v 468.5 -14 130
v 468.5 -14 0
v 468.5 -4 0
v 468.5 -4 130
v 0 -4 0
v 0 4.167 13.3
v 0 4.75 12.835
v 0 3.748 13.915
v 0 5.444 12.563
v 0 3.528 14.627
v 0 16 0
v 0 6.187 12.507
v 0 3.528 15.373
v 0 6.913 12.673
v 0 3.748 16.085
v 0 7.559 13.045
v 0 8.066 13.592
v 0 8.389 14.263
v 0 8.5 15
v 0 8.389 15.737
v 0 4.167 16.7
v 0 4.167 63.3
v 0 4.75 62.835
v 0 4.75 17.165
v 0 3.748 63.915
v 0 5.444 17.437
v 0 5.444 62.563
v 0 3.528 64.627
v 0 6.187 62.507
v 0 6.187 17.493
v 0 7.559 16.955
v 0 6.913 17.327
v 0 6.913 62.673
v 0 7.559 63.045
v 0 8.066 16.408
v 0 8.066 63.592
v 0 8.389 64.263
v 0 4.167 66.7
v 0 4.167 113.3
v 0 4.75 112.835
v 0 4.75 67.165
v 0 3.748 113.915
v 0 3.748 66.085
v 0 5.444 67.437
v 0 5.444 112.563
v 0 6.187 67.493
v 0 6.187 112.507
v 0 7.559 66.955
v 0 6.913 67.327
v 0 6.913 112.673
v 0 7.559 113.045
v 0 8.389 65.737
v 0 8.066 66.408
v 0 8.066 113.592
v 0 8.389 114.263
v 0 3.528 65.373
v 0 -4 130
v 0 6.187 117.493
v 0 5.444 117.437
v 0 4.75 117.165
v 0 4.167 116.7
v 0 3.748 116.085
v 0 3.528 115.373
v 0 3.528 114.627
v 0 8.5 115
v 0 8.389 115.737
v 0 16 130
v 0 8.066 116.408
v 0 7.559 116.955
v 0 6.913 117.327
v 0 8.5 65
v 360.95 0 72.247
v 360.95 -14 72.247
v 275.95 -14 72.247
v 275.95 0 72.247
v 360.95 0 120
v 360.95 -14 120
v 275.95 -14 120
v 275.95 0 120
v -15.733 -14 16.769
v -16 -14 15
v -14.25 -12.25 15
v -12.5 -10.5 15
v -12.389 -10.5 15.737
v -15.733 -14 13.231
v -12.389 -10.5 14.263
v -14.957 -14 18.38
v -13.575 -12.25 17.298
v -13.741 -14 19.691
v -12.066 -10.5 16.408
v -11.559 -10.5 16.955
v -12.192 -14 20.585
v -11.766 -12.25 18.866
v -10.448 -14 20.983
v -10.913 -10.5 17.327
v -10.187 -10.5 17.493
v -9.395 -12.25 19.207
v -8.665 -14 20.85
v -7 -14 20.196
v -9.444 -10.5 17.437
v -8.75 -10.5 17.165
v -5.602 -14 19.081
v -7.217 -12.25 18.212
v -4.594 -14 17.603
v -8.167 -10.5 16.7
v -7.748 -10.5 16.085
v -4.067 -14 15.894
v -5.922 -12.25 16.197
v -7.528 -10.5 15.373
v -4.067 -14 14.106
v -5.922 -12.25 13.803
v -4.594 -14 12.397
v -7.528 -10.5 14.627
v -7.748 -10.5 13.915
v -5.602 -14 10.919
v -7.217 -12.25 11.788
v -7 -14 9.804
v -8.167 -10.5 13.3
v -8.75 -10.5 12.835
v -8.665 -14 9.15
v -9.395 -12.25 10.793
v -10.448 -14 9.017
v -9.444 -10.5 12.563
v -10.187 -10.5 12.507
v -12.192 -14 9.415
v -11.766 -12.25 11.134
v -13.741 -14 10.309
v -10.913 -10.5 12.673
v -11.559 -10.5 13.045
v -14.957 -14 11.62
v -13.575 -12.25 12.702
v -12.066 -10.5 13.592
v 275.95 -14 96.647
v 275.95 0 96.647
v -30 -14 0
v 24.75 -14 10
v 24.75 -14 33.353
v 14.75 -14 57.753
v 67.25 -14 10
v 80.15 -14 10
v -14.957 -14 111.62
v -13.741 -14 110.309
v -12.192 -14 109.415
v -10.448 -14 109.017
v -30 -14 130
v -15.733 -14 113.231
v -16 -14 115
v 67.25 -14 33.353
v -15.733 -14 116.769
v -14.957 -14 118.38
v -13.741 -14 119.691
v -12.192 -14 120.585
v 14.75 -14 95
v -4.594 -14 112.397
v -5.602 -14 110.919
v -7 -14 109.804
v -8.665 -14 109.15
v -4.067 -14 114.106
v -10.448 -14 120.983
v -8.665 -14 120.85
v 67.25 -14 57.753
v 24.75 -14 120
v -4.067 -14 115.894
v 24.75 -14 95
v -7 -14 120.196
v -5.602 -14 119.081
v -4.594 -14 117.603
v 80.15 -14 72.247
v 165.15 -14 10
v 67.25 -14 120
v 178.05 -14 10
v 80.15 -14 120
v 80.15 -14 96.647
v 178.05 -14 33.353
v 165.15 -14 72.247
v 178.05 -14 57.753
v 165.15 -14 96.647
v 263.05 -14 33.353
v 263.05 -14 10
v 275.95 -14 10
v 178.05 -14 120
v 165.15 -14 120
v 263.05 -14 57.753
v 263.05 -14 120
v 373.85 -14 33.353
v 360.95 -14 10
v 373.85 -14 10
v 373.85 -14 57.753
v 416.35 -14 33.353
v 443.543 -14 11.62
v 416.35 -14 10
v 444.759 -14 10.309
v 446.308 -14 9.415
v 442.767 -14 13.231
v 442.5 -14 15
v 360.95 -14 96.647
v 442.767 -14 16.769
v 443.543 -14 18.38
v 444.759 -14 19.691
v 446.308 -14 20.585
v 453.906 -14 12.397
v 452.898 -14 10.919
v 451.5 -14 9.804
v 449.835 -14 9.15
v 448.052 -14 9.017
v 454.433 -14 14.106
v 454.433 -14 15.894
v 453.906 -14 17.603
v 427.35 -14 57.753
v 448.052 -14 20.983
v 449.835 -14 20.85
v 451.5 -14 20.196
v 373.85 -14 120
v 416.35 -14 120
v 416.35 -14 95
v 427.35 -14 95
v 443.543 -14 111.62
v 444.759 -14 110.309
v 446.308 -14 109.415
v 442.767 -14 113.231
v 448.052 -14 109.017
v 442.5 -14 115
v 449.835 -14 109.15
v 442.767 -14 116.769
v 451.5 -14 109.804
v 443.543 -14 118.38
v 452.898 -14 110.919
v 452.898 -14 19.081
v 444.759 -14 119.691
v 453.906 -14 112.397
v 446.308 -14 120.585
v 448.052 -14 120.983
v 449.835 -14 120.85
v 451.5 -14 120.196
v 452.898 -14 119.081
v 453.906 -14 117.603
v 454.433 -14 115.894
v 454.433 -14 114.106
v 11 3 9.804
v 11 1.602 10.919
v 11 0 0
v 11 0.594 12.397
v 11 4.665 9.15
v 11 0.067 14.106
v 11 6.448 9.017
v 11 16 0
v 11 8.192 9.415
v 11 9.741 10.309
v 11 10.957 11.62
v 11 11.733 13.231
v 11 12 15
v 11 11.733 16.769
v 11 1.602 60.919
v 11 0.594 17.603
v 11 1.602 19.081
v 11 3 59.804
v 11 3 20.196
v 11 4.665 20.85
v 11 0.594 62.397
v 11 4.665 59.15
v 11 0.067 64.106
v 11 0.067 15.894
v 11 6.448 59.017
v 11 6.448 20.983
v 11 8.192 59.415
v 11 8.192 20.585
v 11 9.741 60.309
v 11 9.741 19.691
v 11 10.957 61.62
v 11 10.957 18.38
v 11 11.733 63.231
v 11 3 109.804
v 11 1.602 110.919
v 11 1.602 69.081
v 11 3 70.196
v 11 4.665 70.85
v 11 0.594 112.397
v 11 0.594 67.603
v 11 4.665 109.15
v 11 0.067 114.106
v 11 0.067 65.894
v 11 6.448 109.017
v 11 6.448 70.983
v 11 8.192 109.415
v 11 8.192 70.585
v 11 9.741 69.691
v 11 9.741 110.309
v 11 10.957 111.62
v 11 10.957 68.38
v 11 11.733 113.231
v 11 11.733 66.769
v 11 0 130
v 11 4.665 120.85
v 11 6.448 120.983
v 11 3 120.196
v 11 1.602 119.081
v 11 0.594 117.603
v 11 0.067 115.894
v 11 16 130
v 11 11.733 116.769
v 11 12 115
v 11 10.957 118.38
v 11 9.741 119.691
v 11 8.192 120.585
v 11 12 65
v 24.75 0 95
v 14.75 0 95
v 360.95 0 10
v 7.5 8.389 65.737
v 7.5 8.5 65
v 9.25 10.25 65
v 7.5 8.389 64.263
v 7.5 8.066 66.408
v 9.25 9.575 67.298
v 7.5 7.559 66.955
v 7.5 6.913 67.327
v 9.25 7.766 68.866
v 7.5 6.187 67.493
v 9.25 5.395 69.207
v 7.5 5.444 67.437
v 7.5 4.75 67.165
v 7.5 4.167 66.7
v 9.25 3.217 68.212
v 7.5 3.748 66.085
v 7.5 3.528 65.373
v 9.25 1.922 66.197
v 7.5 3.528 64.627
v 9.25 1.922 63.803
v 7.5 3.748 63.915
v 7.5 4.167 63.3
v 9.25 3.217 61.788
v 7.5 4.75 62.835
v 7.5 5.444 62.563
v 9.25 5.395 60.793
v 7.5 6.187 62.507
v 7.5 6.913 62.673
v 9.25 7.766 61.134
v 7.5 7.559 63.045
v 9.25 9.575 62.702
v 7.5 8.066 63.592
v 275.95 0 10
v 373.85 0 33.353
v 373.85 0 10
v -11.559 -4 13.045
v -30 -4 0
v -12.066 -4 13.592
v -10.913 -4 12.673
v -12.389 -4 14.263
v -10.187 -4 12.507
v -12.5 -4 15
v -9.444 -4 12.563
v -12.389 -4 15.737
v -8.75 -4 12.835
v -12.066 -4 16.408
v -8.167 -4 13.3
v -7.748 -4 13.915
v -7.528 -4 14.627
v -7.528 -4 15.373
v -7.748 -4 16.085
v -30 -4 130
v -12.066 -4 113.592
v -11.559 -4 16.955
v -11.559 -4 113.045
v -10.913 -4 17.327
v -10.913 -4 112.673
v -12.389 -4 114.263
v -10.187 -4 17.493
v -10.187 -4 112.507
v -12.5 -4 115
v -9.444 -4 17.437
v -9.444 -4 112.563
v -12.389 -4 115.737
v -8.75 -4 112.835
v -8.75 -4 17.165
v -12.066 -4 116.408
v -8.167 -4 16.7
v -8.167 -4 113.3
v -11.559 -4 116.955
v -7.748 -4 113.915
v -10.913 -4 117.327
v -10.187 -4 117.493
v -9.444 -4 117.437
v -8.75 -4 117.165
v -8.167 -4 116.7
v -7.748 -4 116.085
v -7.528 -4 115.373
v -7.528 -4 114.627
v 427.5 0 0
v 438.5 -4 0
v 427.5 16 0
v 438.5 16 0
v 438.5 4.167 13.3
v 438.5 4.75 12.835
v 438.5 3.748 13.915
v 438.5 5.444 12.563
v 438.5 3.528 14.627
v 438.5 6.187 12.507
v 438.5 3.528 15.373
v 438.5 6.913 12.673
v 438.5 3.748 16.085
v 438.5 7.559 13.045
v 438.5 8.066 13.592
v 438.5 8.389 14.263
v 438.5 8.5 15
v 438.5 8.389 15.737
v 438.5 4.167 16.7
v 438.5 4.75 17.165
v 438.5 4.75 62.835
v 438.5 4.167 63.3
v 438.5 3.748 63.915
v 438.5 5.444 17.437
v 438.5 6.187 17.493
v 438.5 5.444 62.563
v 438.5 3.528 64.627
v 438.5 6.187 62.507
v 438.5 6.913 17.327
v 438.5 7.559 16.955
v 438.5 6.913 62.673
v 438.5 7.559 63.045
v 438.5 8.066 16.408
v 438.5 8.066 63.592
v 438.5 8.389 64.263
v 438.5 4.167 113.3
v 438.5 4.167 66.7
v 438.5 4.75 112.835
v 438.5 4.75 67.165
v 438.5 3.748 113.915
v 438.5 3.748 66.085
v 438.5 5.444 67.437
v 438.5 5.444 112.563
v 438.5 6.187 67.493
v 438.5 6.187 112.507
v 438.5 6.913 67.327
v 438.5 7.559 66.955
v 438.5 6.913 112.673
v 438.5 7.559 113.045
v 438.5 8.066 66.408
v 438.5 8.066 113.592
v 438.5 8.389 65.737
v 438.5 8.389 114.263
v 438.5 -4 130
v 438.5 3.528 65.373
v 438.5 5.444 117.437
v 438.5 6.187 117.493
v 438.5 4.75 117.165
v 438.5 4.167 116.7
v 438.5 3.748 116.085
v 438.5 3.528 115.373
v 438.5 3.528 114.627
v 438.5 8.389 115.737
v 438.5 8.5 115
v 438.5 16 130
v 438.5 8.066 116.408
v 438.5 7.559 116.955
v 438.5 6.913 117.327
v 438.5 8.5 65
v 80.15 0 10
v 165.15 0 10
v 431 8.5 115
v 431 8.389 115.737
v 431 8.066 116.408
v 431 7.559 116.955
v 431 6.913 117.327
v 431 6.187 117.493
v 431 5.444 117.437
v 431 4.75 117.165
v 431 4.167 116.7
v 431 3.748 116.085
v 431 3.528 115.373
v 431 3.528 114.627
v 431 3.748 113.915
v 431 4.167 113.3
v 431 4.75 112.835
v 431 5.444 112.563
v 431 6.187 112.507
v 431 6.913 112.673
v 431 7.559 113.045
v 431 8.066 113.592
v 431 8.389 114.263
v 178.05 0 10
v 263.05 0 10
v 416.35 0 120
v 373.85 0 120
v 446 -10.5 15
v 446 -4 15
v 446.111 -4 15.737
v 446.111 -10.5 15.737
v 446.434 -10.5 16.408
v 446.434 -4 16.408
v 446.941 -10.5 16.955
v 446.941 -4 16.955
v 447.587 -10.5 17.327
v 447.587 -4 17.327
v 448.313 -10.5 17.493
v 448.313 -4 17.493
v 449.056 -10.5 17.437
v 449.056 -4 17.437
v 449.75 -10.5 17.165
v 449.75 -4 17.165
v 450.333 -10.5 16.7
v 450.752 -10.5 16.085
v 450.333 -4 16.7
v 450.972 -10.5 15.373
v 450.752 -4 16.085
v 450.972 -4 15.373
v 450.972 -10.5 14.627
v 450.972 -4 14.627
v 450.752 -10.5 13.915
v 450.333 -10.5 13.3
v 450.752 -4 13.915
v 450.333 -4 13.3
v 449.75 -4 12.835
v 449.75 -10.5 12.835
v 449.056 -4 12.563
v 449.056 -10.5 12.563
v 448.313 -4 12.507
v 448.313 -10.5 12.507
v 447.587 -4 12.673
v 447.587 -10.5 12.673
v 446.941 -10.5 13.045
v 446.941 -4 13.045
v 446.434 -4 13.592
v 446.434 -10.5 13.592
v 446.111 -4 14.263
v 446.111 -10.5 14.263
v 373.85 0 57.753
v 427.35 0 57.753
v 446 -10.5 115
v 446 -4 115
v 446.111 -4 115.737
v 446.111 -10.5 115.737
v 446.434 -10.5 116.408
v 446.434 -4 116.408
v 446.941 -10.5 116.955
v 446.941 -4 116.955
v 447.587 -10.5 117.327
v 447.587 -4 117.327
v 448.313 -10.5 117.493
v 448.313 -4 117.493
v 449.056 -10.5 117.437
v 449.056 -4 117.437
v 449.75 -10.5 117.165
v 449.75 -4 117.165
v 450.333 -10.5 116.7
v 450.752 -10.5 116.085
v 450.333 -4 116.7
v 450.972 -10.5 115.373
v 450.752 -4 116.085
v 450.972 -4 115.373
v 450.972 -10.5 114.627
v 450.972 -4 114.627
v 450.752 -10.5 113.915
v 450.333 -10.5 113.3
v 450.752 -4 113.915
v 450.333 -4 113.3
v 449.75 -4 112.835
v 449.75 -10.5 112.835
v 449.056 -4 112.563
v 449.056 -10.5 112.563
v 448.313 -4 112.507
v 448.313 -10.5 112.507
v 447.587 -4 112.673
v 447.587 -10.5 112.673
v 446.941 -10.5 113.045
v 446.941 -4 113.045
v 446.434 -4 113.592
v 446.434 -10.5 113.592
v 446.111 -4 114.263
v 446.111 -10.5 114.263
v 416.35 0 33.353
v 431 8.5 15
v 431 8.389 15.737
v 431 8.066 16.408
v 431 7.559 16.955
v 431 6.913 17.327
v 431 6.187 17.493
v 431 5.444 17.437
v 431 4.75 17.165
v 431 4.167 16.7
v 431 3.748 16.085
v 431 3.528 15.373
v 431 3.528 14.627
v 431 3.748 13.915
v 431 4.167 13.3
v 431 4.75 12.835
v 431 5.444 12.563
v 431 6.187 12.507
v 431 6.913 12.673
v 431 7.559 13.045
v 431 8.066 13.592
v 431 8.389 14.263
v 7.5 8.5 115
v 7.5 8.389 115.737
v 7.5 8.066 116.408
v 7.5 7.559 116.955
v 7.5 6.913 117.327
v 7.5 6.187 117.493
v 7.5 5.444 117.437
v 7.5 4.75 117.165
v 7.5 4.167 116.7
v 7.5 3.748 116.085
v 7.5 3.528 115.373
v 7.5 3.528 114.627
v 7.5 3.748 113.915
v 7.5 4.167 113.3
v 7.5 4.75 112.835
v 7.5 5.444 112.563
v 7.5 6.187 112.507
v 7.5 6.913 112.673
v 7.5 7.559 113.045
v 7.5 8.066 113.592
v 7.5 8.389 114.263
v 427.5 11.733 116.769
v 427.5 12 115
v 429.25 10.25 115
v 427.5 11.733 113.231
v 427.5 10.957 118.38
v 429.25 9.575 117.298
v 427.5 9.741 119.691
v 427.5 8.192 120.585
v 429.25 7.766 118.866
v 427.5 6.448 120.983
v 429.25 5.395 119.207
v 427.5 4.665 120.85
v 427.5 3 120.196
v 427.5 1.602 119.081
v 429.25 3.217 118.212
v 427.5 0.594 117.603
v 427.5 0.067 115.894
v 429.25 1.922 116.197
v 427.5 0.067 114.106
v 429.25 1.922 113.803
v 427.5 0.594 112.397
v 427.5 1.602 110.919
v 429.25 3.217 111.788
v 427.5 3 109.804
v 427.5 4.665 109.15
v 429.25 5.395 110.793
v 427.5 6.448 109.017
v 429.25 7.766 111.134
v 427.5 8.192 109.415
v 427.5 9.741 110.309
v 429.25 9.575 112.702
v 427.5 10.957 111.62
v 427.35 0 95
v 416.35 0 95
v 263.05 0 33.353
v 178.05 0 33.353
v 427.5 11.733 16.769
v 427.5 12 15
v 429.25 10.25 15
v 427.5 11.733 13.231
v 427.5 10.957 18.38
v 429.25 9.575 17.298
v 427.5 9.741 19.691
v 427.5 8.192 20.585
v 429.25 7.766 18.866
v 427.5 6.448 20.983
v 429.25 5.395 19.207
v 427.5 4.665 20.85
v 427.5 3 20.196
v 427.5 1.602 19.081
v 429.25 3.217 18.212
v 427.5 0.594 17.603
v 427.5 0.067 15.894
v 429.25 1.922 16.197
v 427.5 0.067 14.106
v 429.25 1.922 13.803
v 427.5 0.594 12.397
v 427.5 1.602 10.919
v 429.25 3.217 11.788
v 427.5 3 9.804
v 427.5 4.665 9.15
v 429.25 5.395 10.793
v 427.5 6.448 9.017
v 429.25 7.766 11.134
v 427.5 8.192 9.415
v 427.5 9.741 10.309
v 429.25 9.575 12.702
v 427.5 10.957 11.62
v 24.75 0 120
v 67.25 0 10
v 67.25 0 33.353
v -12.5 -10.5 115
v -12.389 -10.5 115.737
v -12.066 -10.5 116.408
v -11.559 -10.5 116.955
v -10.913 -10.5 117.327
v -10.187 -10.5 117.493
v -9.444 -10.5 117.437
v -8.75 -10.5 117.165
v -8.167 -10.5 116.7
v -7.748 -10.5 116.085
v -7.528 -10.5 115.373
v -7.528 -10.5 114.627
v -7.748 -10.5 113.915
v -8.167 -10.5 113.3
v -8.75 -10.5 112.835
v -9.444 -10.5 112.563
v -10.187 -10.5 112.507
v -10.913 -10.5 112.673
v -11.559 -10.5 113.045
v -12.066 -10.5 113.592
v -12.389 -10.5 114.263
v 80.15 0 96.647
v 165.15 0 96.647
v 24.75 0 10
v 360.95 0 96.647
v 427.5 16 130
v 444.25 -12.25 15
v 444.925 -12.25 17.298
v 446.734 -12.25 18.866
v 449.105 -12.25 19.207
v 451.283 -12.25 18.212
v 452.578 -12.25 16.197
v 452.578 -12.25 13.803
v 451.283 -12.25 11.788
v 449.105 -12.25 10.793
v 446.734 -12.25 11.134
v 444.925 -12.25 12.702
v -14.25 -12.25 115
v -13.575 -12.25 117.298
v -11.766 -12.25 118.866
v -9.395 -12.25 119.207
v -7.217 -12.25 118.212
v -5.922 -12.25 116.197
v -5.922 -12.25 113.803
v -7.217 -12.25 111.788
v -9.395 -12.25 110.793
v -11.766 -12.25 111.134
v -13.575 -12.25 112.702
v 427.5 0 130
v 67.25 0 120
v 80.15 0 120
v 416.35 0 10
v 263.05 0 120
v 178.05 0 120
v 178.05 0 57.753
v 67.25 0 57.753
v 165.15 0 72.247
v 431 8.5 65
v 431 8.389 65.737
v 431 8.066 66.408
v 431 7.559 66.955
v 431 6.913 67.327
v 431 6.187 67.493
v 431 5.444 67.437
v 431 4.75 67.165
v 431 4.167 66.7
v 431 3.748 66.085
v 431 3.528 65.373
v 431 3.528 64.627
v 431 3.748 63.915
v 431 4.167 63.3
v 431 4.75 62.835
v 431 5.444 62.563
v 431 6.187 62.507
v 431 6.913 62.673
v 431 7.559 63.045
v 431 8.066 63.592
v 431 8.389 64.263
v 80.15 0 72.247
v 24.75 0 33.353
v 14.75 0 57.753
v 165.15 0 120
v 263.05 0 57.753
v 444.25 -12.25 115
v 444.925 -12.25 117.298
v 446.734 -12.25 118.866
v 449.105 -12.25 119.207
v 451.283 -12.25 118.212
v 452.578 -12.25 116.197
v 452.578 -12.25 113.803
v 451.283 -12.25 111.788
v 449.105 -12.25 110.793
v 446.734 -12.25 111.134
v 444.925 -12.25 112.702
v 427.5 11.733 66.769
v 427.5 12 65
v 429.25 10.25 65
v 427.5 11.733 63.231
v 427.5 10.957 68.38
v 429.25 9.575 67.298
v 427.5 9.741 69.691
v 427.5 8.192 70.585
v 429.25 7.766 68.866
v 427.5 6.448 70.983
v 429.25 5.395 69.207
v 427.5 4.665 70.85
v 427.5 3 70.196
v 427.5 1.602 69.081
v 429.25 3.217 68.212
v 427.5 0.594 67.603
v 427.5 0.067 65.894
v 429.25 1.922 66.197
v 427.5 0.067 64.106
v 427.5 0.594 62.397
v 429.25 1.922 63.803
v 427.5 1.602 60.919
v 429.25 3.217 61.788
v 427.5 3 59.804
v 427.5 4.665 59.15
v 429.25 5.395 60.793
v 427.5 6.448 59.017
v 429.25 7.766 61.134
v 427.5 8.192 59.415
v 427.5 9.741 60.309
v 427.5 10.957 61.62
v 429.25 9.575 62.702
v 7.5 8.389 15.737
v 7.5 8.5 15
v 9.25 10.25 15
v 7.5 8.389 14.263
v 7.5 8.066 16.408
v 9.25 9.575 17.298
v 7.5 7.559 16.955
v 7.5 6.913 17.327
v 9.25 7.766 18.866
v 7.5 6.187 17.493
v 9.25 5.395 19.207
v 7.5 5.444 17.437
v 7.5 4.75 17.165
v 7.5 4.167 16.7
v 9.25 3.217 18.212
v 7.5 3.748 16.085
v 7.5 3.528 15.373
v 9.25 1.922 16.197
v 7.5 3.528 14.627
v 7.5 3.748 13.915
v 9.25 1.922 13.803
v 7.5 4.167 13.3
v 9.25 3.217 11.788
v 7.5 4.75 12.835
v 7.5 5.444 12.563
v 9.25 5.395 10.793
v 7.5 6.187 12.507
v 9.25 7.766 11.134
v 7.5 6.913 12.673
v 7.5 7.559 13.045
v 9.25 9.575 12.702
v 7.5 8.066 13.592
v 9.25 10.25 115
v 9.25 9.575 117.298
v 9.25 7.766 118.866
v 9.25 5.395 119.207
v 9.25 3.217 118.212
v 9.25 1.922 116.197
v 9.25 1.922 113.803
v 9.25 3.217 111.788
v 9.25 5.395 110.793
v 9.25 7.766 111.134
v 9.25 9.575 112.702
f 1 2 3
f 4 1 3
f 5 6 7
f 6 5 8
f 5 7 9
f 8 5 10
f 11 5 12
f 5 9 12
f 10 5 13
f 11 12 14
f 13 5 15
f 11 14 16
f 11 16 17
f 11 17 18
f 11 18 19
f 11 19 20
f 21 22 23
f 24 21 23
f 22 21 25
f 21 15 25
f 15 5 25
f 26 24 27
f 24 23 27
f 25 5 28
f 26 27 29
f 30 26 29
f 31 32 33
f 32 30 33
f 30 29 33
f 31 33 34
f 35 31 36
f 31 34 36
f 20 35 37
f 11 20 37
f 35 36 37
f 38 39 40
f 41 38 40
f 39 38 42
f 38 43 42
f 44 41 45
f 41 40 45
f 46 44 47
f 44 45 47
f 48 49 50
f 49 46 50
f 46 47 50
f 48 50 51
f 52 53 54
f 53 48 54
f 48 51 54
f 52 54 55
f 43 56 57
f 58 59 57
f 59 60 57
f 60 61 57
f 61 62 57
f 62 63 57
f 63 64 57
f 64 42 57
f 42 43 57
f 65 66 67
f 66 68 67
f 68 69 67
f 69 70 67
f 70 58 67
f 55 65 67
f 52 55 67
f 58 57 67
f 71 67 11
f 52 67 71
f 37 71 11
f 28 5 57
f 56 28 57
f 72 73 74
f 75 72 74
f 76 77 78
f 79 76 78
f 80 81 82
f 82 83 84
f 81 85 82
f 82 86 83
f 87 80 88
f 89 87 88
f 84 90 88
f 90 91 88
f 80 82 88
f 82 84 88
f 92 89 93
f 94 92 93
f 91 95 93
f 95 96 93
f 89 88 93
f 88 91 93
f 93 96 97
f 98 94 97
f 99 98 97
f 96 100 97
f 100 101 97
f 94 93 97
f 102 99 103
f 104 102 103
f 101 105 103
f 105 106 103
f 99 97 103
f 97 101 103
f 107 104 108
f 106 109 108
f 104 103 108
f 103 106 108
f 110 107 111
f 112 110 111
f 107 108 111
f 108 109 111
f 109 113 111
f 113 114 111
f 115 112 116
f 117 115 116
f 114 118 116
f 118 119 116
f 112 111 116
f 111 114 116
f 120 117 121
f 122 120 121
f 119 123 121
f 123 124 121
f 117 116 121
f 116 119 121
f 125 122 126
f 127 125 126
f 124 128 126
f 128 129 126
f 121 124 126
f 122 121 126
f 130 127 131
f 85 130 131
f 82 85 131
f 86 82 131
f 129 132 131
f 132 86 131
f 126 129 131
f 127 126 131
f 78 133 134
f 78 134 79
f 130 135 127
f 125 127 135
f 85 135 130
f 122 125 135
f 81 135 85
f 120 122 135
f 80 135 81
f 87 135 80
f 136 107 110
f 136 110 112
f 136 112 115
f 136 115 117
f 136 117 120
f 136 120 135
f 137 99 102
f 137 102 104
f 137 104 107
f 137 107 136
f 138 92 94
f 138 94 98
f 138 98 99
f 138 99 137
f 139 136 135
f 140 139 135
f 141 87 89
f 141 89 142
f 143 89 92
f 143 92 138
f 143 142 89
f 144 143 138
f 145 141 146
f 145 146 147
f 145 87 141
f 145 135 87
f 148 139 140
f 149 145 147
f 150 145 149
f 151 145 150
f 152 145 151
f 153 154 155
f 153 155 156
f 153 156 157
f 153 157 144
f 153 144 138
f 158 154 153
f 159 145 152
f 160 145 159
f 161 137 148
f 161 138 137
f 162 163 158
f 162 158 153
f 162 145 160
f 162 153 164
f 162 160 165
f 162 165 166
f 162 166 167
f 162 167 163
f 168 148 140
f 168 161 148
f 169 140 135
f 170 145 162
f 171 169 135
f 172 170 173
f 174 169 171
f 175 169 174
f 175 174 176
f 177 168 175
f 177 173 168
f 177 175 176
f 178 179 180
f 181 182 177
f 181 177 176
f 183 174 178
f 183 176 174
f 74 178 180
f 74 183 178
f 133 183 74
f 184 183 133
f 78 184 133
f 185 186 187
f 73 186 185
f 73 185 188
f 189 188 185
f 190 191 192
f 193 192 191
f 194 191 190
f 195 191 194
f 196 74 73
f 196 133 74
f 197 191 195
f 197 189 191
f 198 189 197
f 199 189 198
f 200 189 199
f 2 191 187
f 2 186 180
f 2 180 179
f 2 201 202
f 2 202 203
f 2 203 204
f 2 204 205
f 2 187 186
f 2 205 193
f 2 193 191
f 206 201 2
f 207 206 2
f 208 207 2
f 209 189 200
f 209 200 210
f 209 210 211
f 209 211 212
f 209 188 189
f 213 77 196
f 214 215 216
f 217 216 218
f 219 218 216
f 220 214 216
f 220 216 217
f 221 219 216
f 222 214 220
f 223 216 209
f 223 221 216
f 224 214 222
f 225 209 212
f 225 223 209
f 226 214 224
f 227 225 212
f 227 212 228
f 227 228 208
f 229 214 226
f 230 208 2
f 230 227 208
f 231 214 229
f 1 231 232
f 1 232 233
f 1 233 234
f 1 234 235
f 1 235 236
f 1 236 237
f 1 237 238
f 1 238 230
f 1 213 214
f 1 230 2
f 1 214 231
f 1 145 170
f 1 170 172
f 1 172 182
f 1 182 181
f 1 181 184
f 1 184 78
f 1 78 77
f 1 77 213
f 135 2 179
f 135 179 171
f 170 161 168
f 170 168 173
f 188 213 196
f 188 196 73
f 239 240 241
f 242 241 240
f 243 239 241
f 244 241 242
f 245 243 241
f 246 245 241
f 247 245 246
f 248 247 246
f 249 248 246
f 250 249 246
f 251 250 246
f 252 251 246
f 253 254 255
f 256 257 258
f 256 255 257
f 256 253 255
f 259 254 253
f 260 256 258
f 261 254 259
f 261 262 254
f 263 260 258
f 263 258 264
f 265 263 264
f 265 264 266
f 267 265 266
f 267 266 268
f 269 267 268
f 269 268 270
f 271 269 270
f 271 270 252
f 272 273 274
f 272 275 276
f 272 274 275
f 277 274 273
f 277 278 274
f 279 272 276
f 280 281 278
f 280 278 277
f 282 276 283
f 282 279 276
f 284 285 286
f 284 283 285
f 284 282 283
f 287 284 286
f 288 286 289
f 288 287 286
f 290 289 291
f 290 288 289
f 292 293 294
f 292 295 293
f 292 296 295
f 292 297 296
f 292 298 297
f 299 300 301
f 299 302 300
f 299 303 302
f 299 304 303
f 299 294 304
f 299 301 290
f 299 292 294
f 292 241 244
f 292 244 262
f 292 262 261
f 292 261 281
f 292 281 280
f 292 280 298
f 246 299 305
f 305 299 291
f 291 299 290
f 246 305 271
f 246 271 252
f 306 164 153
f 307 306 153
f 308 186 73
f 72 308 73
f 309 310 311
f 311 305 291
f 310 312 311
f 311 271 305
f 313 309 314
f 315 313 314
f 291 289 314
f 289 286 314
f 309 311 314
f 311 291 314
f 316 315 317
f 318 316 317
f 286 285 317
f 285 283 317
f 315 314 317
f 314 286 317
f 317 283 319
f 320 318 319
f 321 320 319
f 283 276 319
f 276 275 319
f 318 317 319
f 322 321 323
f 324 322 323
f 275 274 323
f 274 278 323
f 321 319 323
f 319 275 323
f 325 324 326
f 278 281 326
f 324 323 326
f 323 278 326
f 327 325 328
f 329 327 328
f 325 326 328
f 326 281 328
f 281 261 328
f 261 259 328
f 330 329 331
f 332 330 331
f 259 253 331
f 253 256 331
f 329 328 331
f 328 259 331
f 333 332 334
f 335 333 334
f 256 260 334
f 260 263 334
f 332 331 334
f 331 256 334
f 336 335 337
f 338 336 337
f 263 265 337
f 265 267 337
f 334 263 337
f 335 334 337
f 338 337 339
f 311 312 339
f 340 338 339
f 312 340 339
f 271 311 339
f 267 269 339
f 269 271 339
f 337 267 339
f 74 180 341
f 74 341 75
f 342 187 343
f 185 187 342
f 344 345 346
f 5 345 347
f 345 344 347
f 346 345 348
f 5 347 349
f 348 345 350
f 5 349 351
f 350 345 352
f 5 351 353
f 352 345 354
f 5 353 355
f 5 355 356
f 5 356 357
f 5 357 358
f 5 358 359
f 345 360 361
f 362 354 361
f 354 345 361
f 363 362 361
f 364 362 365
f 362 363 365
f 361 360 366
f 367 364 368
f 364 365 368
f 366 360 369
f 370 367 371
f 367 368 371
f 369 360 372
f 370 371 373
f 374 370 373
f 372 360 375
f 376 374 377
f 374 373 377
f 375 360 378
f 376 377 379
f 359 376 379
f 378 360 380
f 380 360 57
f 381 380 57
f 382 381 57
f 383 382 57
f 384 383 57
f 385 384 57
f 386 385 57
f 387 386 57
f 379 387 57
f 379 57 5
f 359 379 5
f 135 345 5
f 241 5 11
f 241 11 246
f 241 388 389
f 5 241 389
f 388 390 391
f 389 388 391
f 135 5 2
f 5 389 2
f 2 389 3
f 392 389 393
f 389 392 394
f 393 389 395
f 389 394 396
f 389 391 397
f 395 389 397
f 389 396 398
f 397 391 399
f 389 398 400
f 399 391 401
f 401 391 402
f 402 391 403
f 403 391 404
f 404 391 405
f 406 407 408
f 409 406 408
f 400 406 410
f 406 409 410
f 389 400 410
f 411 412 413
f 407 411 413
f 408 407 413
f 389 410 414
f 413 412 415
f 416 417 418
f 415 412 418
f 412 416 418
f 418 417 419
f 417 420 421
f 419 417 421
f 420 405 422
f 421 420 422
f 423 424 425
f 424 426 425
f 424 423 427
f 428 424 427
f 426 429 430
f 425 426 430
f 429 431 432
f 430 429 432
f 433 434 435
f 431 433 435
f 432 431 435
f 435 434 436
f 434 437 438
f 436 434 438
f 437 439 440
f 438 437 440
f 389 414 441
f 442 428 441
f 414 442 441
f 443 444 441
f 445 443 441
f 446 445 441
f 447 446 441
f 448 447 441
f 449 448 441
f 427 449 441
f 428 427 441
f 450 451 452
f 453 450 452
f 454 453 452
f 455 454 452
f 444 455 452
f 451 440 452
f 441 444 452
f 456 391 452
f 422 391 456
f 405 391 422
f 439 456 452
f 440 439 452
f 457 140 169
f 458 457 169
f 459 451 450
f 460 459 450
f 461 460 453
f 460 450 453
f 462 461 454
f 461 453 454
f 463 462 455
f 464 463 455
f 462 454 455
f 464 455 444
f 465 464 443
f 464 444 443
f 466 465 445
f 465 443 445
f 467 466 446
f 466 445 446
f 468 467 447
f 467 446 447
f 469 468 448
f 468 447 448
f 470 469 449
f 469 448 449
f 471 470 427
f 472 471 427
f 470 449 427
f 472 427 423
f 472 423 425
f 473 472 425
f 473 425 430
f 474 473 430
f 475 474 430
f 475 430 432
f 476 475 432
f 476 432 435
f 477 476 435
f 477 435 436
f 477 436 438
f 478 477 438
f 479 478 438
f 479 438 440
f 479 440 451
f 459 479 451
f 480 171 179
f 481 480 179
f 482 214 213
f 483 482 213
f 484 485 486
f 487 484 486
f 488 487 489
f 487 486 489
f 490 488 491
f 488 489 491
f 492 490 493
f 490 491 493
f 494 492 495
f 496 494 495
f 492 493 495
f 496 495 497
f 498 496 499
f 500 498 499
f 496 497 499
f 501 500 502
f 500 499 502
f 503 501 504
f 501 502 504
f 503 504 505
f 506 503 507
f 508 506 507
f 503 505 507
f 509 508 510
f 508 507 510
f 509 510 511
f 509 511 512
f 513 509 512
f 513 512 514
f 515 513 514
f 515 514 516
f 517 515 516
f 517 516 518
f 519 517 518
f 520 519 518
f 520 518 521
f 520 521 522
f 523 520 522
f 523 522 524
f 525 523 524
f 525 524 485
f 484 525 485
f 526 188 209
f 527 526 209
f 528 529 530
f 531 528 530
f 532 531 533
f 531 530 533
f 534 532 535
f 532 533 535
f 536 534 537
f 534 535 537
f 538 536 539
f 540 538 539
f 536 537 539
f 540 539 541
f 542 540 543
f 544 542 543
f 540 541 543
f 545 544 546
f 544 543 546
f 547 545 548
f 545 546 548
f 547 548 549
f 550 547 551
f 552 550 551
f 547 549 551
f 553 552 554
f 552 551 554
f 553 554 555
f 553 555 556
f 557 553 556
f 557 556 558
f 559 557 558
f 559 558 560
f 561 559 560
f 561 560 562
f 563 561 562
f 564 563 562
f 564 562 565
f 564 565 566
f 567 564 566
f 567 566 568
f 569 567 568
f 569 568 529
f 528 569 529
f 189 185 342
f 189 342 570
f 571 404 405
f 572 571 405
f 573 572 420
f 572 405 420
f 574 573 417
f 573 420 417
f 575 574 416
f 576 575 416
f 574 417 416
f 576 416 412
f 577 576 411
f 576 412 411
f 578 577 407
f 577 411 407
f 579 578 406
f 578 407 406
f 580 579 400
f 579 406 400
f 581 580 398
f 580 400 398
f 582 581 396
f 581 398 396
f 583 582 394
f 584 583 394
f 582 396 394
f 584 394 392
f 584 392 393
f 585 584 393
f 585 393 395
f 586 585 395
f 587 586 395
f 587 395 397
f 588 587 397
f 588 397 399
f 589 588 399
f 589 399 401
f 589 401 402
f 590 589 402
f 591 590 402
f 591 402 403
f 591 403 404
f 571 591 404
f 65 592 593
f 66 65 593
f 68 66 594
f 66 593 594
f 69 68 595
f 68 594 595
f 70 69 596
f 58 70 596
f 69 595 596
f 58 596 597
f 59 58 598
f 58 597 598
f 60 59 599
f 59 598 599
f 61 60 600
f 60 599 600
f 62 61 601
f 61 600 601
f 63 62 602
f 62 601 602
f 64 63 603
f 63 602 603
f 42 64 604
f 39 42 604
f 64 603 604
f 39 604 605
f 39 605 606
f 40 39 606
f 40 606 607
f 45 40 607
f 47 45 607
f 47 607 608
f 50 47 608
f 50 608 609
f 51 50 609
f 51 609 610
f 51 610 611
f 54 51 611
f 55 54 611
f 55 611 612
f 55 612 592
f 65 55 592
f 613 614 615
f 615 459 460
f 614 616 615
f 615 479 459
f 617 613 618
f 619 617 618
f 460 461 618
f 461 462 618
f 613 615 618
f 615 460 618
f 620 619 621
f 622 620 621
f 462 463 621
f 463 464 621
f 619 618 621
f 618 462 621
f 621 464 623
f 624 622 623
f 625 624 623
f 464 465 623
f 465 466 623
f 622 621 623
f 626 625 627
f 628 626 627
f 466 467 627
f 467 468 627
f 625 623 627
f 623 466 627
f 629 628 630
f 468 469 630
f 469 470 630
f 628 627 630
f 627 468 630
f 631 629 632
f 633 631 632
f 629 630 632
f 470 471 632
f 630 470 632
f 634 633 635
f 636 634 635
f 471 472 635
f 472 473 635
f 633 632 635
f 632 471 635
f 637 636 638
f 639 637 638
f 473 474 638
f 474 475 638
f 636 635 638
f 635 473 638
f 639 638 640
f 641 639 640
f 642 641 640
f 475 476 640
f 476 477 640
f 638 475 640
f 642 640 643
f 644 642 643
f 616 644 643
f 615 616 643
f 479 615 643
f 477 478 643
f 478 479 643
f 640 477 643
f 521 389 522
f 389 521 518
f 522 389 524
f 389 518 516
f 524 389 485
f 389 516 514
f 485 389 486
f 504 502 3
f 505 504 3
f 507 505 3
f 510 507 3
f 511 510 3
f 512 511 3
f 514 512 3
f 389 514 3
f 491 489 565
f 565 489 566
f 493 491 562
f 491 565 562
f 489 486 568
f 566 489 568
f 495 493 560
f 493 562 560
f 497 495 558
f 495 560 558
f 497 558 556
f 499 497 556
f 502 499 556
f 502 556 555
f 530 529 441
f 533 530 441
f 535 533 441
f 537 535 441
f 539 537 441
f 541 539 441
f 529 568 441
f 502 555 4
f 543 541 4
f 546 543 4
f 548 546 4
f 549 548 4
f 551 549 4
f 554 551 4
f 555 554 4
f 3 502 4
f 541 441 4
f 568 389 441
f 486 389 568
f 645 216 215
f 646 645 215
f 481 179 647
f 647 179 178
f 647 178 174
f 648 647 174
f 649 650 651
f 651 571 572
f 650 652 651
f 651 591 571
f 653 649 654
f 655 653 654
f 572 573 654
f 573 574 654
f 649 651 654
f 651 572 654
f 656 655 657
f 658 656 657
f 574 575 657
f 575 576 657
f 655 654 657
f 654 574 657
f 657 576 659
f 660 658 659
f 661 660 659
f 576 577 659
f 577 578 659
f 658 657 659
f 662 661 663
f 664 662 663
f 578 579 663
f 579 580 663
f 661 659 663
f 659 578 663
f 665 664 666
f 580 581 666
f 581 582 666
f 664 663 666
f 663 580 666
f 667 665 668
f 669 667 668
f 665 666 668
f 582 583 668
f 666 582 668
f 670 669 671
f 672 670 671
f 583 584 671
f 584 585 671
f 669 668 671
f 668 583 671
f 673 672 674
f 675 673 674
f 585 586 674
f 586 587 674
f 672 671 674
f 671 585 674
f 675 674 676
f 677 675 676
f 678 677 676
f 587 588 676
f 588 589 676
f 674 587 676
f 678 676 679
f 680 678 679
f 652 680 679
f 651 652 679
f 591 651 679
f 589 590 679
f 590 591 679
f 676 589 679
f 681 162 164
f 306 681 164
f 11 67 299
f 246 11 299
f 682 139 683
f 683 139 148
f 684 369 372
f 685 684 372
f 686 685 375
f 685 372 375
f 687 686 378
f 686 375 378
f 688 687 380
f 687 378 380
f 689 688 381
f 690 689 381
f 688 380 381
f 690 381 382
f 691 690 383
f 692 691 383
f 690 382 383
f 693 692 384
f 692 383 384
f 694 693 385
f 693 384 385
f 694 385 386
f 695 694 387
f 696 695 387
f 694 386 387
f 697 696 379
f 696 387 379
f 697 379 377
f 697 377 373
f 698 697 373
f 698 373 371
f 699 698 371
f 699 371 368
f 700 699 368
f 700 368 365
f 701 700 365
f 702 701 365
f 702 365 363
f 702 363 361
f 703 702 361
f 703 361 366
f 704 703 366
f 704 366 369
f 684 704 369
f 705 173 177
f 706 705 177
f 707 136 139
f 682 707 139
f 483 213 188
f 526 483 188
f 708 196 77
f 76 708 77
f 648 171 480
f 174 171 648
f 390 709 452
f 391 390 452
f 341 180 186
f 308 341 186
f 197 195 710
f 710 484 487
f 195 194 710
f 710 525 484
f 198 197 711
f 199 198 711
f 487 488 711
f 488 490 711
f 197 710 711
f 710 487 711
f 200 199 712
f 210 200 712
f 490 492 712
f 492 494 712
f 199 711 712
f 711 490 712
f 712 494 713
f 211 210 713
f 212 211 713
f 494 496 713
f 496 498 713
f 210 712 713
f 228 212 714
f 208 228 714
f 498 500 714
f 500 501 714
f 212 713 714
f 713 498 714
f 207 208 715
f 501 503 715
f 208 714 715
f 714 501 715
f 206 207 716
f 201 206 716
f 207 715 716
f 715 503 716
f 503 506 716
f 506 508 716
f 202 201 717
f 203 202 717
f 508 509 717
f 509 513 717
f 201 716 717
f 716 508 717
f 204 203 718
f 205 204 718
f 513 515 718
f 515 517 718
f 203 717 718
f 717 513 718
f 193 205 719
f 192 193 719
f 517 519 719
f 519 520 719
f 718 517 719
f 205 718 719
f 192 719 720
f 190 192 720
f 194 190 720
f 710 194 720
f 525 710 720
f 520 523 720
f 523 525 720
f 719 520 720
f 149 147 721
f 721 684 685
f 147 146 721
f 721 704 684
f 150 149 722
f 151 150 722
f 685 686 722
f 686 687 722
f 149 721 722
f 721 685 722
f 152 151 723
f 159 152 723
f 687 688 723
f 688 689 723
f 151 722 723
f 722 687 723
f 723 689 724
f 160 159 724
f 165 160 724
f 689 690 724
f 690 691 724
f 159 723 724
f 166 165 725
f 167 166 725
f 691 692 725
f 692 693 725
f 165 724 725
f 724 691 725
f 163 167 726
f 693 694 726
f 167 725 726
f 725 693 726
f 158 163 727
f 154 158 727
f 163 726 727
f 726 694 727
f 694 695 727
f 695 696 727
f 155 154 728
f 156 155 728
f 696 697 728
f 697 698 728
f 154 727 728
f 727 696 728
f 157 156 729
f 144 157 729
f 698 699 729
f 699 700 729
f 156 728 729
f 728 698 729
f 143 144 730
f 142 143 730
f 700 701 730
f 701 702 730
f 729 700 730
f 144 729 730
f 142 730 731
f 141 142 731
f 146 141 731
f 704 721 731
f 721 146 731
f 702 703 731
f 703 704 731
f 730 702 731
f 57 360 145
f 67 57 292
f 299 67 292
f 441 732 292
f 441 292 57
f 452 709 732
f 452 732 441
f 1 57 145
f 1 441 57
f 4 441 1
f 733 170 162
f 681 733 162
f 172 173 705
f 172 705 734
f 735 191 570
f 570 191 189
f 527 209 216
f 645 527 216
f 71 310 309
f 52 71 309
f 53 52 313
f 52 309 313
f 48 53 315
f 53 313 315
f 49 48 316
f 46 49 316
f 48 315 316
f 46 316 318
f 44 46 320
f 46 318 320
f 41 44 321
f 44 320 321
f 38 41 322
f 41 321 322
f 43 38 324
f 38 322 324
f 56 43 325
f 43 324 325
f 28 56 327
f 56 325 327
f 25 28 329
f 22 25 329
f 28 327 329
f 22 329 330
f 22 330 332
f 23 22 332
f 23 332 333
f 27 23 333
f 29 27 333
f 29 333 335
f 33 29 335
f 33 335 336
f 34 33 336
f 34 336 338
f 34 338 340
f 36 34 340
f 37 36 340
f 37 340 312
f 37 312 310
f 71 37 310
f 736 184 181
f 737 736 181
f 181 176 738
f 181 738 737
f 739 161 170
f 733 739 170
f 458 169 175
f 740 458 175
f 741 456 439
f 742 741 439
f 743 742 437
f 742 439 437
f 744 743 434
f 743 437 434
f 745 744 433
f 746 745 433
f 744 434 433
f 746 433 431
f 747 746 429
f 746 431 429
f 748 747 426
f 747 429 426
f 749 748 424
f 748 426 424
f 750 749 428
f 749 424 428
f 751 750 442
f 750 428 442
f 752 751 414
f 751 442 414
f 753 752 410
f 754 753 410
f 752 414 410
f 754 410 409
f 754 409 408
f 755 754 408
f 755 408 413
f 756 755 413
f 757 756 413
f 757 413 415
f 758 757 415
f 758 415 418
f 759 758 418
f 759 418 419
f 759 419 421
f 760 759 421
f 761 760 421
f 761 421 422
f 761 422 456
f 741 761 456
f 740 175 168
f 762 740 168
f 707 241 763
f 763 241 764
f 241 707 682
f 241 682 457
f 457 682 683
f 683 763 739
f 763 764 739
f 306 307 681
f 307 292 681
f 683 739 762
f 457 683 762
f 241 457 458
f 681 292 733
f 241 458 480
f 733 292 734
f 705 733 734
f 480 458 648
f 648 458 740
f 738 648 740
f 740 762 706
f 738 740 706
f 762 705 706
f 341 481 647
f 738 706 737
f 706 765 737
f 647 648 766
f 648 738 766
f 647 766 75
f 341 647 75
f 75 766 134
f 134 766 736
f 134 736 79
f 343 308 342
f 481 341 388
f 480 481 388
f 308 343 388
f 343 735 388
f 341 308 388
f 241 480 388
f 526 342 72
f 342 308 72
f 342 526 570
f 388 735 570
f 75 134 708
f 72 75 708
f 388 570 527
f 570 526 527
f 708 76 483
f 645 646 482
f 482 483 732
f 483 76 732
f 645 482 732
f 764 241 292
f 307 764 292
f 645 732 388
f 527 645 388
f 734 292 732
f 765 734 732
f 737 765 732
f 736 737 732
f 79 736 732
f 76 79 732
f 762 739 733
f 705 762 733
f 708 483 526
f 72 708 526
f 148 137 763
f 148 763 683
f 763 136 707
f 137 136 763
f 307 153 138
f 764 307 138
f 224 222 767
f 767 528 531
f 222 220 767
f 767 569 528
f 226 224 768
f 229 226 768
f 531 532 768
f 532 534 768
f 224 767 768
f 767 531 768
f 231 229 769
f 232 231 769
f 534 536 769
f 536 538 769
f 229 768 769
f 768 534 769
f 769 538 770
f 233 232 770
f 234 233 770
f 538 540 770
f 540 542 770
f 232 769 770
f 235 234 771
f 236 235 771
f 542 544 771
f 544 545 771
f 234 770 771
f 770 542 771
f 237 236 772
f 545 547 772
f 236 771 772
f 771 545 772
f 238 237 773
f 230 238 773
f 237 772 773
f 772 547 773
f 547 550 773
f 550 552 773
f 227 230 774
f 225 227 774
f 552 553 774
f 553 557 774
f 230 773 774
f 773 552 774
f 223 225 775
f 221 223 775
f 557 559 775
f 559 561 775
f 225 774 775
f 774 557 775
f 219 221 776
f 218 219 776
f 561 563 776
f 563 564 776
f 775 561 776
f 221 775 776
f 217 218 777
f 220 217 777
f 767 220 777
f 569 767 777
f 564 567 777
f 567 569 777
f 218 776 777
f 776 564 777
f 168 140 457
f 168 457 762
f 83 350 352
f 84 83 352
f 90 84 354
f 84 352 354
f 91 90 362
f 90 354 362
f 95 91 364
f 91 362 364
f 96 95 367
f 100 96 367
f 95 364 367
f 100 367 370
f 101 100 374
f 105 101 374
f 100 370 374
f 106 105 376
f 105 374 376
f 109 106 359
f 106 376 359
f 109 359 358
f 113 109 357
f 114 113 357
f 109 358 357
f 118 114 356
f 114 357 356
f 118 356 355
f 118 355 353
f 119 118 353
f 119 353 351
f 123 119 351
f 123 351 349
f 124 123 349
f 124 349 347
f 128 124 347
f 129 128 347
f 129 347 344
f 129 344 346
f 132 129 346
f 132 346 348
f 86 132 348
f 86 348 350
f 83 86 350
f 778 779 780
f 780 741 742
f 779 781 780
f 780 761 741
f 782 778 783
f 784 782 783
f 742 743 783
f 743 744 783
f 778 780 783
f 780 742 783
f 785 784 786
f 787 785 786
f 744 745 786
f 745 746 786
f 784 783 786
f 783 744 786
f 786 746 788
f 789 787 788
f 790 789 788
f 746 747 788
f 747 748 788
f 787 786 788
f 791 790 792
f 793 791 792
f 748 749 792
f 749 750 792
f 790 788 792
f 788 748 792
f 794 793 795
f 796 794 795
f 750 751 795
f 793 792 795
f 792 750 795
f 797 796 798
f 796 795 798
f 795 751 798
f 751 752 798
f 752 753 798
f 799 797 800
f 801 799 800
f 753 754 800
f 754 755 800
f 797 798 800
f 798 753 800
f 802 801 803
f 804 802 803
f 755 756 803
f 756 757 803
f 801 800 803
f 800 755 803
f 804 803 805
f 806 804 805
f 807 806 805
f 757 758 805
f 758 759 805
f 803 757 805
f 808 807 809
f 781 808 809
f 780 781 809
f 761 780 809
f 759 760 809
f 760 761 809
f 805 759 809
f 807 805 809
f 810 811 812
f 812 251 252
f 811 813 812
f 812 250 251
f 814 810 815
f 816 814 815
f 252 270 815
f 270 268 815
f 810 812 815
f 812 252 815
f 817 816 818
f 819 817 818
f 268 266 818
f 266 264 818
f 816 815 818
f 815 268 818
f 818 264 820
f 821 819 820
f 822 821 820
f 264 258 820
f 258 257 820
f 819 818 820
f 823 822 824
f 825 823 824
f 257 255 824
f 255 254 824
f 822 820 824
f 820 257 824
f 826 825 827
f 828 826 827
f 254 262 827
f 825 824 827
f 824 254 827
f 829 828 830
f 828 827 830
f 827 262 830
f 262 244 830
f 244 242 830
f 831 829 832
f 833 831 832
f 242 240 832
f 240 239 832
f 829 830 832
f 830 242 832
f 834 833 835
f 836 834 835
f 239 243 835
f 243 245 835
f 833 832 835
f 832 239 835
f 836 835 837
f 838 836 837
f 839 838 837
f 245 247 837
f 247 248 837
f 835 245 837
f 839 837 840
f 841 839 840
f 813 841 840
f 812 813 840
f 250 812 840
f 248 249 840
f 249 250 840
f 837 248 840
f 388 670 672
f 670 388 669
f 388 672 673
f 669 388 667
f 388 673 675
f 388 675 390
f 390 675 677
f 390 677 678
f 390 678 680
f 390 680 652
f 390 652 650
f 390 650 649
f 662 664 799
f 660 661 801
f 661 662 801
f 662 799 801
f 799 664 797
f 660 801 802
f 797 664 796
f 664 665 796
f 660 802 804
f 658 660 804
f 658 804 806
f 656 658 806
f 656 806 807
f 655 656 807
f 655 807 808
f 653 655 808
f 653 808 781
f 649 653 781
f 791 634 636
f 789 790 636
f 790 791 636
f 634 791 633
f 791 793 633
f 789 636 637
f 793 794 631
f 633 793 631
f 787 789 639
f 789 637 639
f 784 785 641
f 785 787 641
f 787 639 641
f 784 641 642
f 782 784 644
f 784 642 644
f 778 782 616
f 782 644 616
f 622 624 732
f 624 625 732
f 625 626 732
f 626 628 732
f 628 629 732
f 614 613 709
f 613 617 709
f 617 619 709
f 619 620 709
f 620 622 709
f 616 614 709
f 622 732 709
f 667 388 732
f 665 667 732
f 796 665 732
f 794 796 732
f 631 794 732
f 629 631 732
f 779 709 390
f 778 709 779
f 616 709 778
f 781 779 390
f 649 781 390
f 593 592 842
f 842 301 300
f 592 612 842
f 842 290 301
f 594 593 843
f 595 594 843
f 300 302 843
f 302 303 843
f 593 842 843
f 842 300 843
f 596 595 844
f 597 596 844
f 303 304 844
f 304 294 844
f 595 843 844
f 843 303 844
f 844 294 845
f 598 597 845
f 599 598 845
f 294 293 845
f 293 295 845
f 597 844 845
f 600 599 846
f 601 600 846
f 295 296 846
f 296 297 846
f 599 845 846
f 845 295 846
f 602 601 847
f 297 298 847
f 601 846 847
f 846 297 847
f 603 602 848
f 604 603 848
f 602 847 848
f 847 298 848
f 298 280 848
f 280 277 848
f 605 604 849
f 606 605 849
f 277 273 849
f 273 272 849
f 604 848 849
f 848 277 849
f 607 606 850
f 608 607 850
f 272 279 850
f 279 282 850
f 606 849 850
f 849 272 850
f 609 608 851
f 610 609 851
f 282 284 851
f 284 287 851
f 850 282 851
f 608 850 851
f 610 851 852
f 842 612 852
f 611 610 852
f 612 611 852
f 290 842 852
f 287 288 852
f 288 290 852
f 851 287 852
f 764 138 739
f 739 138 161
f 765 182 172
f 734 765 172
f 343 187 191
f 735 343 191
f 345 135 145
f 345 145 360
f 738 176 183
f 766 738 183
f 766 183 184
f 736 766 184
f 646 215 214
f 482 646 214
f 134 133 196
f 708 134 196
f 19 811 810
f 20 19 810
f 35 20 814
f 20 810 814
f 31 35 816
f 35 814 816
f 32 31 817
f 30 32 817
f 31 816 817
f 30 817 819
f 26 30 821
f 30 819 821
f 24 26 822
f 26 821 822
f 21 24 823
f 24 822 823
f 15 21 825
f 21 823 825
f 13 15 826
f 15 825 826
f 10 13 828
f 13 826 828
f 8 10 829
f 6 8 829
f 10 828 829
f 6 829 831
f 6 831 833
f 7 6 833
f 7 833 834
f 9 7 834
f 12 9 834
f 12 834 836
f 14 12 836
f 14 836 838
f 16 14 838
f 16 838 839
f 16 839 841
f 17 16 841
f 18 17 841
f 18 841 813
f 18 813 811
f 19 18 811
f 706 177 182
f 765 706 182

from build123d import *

# Parameters (mm, degrees)
F0_W      = 438.5
F0_H      = 130
F1_DEPTH  = 14
F2_W      = 30
F2_H      = 10
F3_DEPTH  = 130
F4_W      = 11
F4_H      = 16
F5_DEPTH  = 130
F6_W      = 42.5
F6_H      = 23.3528089888
F6_H_2    = 62.2471910113
F7_DEPTH  = 25
F8_R      = 2.5
F9_DEPTH  = 25
F10_R     = 2.5
F11_DEPTH = 468.501
F12_SIZE  = 3.49999


# Not quite as in the source:
# - a fillet or chamfer is up to 0.001 mm smaller than in the source, because OpenCascade refuses the exact size
# - a feature names something its author has since deleted; it is built from what else it names


with BuildPart() as f1:
    # F0 (on Front) → F1 (new body)
    with BuildSketch(Plane.XZ):
        with Locations((219.25, 65)):
            Rectangle(F0_W, F0_H)
    extrude(amount=F1_DEPTH)

    # F2 (on face) → F3 (join, through all)
    with BuildSketch(Plane.XY.offset(130)):
        with Locations((453.5, -9)):
            Rectangle(F2_W, F2_H)
        with Locations((-15, -9)):
            Rectangle(F2_W, F2_H)
    extrude(amount=-F3_DEPTH)

    # F4 (on face) → F5 (join, through all)
    with BuildSketch(Plane.XY.offset(130)):
        with Locations((5.5, 8)):
            Rectangle(F4_W, F4_H)
        with Locations((433, 8)):
            Rectangle(F4_W, F4_H)
    extrude(amount=-F5_DEPTH)

    # F6 (on face) → F7 (cut)
    with BuildSketch(Plane.XZ.offset(14)):
        Polygon((24.75, 120), (24.75, 95), (14.75, 95), (14.75, 57.7528089887), (24.75, 57.7528089887), (67.25, 57.7528089887), (67.25, 120), align=None)
        with Locations((46, 21.6764044942)):
            Rectangle(F6_W, F6_H)
        with Locations((101.4, 41.1235955055)):
            Rectangle(F6_W, F6_H_2)
        with Locations((143.9, 41.1235955055)):
            Rectangle(F6_W, F6_H_2)
        with Locations((101.4, 108.3235955056)):
            Rectangle(F6_W, F6_H)
        with Locations((143.9, 108.3235955056)):
            Rectangle(F6_W, F6_H)
        with Locations((199.3, 88.8764044943)):
            Rectangle(F6_W, F6_H_2)
        with Locations((241.8, 88.8764044943)):
            Rectangle(F6_W, F6_H_2)
        with Locations((199.3, 21.6764044942)):
            Rectangle(F6_W, F6_H)
        with Locations((241.8, 21.6764044942)):
            Rectangle(F6_W, F6_H)
        with Locations((297.2, 41.1235955055)):
            Rectangle(F6_W, F6_H_2)
        with Locations((339.7, 41.1235955055)):
            Rectangle(F6_W, F6_H_2)
        with Locations((339.7, 108.3235955056)):
            Rectangle(F6_W, F6_H)
        with Locations((297.2, 108.3235955056)):
            Rectangle(F6_W, F6_H)
        Polygon((416.35, 120), (373.85, 120), (373.85, 57.7528089887), (427.35, 57.7528089887), (427.35, 95), (416.35, 95), align=None)
        with Locations((395.1, 21.6764044942)):
            Rectangle(F6_W, F6_H)
    extrude(amount=-F7_DEPTH, mode=Mode.SUBTRACT)

    # F8 (on face) → F9 (cut)
    with BuildSketch(Plane(origin=(0, -4, 0), x_dir=(-1, 0, 0), z_dir=(0, 1, 0))):
        with Locations((-448.5, 115)):
            Circle(F8_R)
        with Locations((-448.5, 15)):
            Circle(F8_R)
        with Locations((10, 115)):
            Circle(F8_R)
        with Locations((10, 15)):
            Circle(F8_R)
    extrude(amount=-F9_DEPTH, mode=Mode.SUBTRACT)

    # F10 (on face) → F11 (cut, through all)
    with BuildSketch(Plane.YZ.offset(438.5)):
        with Locations((6, 115)):
            Circle(F10_R)
        with Locations((6, 15)):
            Circle(F10_R)
        with Locations((6, 65)):
            Circle(F10_R)
    extrude(amount=-F11_DEPTH, mode=Mode.SUBTRACT)

    # F12 (size 3.5 in the source; OpenCascade refuses exactly that, so slightly less here)
    f12_edges = [f1.edges().sort_by_distance(p)[0] for p in [
        (451, -14, 115),
        (451, -14, 15),
        (-7.5, -14, 115),
        (-7.5, -14, 15),
        (427.5, 3.5, 115),
        (427.5, 3.5, 65),
        (427.5, 3.5, 15),
        (11, 3.5, 115),
        (11, 3.5, 65),
        (11, 3.5, 15),
    ]]
    chamfer(f12_edges, length=F12_SIZE)


solid = f1.part
